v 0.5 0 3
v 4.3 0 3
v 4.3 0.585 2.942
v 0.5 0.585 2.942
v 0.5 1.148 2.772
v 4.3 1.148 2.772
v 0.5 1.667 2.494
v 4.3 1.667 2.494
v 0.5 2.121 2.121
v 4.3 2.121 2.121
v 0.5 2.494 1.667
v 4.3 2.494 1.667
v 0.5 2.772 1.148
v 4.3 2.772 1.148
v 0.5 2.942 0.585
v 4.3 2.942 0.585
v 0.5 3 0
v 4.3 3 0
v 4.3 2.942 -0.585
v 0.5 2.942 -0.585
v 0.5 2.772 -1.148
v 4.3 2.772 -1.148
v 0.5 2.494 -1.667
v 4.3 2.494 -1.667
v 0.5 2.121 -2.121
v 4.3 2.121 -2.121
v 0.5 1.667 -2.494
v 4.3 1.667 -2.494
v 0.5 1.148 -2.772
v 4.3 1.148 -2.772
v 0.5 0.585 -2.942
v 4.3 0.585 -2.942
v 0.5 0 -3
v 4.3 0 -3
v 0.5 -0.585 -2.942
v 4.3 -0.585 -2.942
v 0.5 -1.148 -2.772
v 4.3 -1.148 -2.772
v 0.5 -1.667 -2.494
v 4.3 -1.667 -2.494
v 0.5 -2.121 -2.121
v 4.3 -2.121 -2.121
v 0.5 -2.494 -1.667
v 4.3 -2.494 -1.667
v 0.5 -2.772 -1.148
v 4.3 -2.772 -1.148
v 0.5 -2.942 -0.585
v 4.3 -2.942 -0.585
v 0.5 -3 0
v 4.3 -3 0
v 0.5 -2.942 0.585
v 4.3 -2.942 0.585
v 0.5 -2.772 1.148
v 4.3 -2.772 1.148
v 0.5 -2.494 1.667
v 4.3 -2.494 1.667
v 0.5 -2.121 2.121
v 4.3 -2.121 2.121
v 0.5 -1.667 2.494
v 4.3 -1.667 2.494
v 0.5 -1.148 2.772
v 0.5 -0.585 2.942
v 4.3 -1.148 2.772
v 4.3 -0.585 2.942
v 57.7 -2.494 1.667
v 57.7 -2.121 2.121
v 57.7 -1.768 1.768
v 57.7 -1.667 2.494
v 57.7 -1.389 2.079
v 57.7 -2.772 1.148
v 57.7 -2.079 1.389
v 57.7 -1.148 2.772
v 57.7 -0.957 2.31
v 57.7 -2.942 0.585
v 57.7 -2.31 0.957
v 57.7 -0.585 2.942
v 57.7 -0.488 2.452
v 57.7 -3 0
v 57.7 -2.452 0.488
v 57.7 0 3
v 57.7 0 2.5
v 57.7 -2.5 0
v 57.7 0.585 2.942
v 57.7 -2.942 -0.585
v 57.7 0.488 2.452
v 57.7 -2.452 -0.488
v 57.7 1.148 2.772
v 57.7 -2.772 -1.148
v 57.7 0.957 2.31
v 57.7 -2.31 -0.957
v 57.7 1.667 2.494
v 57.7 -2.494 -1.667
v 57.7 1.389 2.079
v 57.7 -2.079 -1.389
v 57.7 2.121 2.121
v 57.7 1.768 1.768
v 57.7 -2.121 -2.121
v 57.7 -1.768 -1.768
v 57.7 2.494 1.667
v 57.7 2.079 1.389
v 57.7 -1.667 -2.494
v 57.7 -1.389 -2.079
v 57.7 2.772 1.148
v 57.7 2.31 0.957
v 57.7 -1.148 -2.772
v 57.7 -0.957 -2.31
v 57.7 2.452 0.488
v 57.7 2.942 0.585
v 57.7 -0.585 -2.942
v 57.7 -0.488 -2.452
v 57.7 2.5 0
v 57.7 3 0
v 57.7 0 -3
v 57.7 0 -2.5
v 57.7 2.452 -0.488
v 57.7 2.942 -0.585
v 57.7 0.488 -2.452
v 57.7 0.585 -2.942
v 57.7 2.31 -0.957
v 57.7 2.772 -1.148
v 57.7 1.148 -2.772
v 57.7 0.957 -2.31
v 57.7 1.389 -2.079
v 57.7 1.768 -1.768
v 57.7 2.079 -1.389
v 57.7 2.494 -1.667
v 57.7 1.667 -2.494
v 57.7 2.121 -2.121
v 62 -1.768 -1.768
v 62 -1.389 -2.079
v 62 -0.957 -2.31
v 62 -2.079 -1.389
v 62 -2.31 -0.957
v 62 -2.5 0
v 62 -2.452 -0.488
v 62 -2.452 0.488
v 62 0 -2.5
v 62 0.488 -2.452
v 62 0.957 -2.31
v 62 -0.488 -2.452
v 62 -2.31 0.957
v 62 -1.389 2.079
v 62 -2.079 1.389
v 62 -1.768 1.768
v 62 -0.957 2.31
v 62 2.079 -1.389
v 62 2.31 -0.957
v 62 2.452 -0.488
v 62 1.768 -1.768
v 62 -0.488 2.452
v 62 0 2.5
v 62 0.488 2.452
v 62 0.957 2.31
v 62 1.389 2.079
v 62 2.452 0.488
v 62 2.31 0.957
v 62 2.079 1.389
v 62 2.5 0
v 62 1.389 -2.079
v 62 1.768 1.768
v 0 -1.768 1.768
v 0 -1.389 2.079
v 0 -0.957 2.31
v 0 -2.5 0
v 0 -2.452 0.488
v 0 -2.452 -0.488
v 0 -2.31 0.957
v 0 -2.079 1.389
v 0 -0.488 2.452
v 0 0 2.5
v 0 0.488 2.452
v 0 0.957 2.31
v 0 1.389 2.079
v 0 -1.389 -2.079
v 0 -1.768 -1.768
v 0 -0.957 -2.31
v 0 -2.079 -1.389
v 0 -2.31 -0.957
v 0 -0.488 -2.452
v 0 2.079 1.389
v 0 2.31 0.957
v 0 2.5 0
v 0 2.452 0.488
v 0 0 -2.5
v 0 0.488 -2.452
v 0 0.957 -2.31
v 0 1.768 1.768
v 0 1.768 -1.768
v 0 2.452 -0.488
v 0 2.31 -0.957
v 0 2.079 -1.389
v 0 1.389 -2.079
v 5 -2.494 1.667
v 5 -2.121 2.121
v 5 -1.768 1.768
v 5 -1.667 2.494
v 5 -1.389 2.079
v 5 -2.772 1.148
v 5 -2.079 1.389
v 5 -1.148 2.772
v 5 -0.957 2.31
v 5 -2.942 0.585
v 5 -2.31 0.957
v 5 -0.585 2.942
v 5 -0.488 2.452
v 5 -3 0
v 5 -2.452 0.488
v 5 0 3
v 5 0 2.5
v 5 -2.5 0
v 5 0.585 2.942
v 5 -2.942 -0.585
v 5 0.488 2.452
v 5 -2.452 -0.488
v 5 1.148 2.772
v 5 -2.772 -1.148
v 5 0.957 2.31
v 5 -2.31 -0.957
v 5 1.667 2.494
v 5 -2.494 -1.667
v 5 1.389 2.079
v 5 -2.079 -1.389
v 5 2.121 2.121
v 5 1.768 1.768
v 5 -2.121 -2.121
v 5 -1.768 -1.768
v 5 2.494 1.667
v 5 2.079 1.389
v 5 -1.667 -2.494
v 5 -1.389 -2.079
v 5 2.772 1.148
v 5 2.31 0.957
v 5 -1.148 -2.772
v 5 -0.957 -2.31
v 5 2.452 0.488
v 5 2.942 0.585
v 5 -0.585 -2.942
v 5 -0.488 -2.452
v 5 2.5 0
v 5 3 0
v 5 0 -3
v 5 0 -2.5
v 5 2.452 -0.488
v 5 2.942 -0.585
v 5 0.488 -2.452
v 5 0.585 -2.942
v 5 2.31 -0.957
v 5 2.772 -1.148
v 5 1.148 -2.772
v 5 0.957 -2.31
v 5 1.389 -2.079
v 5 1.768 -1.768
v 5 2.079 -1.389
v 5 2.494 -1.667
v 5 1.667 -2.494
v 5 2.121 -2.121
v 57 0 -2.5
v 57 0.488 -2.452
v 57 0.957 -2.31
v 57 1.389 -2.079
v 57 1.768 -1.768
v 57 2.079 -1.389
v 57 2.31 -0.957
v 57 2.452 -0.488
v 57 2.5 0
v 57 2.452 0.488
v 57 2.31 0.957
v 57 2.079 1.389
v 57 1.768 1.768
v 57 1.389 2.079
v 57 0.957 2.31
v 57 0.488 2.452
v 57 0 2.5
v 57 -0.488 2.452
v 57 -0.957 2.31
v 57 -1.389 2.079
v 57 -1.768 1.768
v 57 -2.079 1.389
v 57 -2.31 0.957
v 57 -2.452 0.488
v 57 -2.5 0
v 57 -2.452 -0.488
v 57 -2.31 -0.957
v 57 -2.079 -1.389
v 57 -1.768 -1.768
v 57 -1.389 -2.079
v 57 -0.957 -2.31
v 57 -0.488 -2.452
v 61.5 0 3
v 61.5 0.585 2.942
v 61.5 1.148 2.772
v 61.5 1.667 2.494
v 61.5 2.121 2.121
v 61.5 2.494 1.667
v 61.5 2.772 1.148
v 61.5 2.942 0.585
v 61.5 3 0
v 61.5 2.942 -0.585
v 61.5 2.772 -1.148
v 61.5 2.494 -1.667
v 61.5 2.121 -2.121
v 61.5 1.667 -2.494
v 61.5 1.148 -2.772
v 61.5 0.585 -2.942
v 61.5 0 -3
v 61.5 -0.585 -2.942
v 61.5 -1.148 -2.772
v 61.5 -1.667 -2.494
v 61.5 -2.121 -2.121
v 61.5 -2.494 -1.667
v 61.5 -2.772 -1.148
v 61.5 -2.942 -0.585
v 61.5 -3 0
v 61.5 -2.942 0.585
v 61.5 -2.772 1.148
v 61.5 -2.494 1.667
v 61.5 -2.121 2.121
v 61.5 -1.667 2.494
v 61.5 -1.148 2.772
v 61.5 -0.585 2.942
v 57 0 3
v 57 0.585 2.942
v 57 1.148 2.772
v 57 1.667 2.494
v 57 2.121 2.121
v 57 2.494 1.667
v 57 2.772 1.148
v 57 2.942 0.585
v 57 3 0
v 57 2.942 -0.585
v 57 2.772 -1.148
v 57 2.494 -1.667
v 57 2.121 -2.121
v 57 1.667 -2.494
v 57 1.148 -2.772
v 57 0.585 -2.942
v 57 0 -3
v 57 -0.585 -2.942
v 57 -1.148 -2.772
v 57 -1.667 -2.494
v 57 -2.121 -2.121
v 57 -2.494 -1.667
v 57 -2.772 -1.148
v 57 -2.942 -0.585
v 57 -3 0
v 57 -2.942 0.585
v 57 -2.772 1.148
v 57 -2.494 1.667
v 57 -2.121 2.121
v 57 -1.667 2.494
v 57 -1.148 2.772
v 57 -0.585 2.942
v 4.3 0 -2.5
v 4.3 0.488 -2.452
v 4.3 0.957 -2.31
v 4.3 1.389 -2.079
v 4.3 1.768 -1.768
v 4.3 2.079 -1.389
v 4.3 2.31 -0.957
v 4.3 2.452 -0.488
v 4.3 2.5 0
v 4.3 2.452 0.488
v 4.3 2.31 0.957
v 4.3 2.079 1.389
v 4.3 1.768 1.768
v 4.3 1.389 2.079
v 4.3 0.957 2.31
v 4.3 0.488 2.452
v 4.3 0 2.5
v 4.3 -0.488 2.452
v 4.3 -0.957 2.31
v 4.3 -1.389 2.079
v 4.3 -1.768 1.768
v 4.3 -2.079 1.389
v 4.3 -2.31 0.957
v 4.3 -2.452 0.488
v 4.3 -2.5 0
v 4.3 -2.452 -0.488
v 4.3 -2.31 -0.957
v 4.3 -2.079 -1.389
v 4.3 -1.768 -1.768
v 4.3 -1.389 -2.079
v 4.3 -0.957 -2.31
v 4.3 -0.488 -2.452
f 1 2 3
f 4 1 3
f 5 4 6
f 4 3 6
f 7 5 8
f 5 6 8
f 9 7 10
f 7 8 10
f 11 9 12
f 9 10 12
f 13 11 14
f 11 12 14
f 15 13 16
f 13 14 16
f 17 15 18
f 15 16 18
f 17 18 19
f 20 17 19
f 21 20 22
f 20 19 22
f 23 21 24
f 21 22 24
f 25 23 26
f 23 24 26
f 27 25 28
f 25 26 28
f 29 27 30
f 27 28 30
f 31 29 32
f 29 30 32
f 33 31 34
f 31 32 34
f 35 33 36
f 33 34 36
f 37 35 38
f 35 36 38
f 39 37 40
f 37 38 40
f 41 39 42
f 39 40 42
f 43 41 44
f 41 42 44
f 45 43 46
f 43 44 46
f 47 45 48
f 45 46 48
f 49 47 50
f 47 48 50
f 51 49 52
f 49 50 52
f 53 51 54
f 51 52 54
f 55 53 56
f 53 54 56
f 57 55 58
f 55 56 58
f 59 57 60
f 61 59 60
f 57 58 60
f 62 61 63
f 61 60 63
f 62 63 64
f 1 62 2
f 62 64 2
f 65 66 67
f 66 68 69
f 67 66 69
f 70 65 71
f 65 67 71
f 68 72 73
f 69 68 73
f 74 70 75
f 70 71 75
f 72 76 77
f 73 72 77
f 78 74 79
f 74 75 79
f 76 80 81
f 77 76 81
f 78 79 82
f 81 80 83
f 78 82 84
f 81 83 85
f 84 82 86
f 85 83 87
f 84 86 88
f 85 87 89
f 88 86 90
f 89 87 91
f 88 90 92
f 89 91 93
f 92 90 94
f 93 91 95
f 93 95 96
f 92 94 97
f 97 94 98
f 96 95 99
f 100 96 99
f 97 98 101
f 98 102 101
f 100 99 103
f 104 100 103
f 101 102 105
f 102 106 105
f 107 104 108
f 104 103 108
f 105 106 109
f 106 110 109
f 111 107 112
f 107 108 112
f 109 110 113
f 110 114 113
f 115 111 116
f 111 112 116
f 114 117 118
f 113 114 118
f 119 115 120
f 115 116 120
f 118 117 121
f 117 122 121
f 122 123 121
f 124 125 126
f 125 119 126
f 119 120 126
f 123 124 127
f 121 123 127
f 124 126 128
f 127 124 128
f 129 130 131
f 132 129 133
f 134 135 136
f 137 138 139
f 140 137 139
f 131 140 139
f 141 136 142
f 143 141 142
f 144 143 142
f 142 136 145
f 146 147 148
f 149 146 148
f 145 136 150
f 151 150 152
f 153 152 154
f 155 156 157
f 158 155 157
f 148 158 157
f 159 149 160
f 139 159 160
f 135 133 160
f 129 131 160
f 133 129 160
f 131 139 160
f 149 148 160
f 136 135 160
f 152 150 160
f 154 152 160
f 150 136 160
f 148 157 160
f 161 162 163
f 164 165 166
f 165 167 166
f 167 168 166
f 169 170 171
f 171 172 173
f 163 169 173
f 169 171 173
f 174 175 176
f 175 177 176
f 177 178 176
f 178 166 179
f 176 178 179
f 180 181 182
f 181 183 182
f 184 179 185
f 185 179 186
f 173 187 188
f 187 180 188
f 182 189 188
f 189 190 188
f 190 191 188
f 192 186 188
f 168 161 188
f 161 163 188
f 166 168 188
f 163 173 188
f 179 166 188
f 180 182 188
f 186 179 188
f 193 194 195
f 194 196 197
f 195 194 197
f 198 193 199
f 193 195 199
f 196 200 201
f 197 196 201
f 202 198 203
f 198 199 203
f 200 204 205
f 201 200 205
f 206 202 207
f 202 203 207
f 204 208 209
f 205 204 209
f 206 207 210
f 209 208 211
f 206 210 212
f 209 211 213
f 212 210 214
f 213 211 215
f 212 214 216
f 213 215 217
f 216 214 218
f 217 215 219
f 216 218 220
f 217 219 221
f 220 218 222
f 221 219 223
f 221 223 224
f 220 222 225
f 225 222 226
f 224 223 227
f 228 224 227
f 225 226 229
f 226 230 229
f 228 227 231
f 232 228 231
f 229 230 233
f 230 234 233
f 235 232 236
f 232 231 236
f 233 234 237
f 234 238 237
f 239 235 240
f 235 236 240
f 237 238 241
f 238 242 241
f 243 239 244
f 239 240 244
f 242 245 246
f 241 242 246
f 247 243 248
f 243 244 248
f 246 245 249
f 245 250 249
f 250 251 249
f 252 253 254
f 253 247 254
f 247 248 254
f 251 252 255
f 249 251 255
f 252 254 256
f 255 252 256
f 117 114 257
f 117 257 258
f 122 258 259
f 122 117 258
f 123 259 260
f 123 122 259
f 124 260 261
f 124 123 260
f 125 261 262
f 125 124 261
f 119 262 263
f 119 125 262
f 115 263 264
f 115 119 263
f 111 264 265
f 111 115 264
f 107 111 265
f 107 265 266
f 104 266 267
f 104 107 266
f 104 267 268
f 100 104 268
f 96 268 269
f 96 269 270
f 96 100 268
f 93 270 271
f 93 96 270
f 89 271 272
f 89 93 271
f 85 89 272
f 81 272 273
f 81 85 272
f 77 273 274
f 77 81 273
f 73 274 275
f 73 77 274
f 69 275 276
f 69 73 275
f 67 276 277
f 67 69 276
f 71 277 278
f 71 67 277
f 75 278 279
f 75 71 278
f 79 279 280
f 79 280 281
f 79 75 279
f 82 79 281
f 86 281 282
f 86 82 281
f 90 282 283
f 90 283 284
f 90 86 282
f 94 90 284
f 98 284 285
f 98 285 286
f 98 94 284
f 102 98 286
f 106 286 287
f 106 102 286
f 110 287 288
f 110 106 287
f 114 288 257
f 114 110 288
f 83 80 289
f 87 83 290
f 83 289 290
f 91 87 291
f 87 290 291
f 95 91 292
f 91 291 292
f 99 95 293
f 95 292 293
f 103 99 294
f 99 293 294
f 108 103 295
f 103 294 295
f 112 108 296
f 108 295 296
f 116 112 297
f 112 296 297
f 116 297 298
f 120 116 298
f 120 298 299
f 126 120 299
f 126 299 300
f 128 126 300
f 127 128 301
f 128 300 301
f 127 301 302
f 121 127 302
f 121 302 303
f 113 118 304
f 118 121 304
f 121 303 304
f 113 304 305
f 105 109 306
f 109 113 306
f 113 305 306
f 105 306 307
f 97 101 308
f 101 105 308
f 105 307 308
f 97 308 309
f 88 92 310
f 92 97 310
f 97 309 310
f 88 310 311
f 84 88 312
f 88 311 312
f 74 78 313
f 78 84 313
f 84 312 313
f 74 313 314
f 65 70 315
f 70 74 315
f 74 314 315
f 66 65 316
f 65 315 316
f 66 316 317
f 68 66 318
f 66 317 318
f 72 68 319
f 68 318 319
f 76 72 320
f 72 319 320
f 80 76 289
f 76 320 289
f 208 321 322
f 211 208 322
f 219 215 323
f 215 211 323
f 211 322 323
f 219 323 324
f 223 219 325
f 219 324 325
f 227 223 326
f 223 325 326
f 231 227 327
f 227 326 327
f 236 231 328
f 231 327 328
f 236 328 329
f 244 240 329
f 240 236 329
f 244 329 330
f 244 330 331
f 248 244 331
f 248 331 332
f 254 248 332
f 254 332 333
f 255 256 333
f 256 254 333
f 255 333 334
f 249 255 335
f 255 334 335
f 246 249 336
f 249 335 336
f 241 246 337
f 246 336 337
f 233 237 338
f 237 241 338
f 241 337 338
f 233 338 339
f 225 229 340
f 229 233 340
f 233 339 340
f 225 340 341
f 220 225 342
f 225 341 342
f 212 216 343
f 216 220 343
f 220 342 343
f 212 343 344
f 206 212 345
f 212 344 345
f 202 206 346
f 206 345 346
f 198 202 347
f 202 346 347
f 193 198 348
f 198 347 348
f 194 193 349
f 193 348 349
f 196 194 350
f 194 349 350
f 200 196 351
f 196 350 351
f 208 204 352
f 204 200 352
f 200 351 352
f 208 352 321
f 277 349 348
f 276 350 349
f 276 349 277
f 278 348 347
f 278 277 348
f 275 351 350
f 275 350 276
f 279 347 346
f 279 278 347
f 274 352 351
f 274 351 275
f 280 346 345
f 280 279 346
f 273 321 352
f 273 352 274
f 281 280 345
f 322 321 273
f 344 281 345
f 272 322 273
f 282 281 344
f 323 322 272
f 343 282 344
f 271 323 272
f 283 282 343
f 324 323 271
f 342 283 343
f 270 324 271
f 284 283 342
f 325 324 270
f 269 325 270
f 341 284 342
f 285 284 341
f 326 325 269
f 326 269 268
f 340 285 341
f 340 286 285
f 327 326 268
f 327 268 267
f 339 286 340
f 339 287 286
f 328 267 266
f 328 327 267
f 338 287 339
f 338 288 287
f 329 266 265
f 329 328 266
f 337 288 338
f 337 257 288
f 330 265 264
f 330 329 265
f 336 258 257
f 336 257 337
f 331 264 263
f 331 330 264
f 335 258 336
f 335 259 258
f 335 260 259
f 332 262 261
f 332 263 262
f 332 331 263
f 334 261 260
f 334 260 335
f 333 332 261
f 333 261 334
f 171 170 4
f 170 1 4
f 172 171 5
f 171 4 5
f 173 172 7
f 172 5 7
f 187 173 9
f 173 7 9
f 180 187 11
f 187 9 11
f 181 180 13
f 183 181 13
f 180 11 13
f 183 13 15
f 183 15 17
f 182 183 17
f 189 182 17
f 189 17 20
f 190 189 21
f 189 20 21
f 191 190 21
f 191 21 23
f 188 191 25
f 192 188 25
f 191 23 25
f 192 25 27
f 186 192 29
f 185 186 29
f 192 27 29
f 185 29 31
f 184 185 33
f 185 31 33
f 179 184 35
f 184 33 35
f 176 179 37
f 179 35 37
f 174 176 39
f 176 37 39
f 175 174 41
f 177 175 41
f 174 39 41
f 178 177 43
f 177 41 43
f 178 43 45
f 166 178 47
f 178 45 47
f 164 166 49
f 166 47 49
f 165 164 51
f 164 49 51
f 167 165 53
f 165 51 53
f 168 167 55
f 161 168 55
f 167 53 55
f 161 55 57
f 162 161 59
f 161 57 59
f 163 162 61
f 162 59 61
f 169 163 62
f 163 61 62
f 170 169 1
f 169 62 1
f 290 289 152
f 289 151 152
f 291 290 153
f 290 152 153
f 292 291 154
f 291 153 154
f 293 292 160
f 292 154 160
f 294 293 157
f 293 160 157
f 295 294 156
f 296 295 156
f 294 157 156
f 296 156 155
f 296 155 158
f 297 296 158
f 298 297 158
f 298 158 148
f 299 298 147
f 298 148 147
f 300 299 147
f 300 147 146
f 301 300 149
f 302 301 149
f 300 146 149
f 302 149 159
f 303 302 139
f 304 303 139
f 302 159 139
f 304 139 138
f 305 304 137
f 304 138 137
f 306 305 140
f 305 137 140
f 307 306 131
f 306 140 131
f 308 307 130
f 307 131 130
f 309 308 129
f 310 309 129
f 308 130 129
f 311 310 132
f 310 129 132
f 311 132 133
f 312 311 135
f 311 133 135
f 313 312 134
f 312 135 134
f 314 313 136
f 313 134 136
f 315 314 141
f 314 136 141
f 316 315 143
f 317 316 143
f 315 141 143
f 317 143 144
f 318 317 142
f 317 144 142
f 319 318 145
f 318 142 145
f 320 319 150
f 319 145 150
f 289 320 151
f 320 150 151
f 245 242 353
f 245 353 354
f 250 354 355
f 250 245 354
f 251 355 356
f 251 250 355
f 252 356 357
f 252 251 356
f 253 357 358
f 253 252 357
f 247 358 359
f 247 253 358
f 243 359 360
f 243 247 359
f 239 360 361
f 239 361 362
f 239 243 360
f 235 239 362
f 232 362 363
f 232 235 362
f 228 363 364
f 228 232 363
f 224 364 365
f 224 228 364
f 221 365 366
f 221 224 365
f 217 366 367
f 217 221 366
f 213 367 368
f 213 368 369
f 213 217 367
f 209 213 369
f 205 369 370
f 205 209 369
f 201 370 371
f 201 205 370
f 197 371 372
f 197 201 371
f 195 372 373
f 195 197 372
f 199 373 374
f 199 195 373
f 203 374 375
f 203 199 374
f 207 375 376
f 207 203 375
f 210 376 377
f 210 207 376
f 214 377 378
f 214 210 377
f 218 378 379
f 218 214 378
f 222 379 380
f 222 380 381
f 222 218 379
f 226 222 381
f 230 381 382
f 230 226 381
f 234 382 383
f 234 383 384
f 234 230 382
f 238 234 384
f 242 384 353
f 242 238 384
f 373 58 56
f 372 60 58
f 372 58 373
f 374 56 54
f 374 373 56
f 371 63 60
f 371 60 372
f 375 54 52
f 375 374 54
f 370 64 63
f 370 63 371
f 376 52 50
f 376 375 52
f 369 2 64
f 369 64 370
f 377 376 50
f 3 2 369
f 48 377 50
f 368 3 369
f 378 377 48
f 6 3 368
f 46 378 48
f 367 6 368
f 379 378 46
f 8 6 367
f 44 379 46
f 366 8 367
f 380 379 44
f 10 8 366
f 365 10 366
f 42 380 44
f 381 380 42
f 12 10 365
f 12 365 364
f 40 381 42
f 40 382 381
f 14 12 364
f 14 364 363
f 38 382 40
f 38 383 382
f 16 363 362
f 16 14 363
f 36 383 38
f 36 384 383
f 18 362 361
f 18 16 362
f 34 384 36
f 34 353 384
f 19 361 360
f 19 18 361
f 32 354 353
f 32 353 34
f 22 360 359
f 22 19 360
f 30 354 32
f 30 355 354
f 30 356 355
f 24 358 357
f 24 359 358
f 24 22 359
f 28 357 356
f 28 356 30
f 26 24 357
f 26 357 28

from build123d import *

# Parameters (mm, degrees)
SKETCH_2_R          = 6
SKETCH_2_R_2        = 2.5
CUT_EXTRUDE_1_DEPTH = 0.7
CUT_EXTRUDE_START   = 0.7
SKETCH_3_R          = 6
SKETCH_3_R_2        = 2.5
CUT_EXTRUDE_2_DEPTH = 0.7


with BuildPart() as part:
    # ｽｹｯﾁ1 → 回転1 (revolve)
    with BuildSketch(Plane.XY, mode=Mode.PRIVATE) as revolve_1_sk:
        Polygon((0, 0), (0, 2.5), (0.5, 3), (61.5, 3), (62, 2.5), (62, 0), align=None)
    revolve(revolve_1_sk.sketch.rotate(Axis((62, 0, 0), (-1, 0, 0)), 270), axis=Axis((62, 0, 0), (-1, 0, 0)))

    # ｽｹｯﾁ2 → ｶｯﾄ - 押し出し1 (cut)
    with BuildSketch(Plane(origin=(5, 0, 0), x_dir=(0, 0, -1), z_dir=(1, 0, 0))):
        Circle(SKETCH_2_R)
        Circle(SKETCH_2_R_2, mode=Mode.SUBTRACT)
    extrude(amount=-CUT_EXTRUDE_1_DEPTH, mode=Mode.SUBTRACT)

    # ｽｹｯﾁ3 → ｶｯﾄ - 押し出し2 (cut)
    with BuildSketch(Plane(origin=(57, 0, 0), x_dir=(0, 0, -1), z_dir=(1, 0, 0)).offset(CUT_EXTRUDE_START)):
        Circle(SKETCH_3_R)
        Circle(SKETCH_3_R_2, mode=Mode.SUBTRACT)
    extrude(amount=-CUT_EXTRUDE_2_DEPTH, mode=Mode.SUBTRACT)


solid = part.part
